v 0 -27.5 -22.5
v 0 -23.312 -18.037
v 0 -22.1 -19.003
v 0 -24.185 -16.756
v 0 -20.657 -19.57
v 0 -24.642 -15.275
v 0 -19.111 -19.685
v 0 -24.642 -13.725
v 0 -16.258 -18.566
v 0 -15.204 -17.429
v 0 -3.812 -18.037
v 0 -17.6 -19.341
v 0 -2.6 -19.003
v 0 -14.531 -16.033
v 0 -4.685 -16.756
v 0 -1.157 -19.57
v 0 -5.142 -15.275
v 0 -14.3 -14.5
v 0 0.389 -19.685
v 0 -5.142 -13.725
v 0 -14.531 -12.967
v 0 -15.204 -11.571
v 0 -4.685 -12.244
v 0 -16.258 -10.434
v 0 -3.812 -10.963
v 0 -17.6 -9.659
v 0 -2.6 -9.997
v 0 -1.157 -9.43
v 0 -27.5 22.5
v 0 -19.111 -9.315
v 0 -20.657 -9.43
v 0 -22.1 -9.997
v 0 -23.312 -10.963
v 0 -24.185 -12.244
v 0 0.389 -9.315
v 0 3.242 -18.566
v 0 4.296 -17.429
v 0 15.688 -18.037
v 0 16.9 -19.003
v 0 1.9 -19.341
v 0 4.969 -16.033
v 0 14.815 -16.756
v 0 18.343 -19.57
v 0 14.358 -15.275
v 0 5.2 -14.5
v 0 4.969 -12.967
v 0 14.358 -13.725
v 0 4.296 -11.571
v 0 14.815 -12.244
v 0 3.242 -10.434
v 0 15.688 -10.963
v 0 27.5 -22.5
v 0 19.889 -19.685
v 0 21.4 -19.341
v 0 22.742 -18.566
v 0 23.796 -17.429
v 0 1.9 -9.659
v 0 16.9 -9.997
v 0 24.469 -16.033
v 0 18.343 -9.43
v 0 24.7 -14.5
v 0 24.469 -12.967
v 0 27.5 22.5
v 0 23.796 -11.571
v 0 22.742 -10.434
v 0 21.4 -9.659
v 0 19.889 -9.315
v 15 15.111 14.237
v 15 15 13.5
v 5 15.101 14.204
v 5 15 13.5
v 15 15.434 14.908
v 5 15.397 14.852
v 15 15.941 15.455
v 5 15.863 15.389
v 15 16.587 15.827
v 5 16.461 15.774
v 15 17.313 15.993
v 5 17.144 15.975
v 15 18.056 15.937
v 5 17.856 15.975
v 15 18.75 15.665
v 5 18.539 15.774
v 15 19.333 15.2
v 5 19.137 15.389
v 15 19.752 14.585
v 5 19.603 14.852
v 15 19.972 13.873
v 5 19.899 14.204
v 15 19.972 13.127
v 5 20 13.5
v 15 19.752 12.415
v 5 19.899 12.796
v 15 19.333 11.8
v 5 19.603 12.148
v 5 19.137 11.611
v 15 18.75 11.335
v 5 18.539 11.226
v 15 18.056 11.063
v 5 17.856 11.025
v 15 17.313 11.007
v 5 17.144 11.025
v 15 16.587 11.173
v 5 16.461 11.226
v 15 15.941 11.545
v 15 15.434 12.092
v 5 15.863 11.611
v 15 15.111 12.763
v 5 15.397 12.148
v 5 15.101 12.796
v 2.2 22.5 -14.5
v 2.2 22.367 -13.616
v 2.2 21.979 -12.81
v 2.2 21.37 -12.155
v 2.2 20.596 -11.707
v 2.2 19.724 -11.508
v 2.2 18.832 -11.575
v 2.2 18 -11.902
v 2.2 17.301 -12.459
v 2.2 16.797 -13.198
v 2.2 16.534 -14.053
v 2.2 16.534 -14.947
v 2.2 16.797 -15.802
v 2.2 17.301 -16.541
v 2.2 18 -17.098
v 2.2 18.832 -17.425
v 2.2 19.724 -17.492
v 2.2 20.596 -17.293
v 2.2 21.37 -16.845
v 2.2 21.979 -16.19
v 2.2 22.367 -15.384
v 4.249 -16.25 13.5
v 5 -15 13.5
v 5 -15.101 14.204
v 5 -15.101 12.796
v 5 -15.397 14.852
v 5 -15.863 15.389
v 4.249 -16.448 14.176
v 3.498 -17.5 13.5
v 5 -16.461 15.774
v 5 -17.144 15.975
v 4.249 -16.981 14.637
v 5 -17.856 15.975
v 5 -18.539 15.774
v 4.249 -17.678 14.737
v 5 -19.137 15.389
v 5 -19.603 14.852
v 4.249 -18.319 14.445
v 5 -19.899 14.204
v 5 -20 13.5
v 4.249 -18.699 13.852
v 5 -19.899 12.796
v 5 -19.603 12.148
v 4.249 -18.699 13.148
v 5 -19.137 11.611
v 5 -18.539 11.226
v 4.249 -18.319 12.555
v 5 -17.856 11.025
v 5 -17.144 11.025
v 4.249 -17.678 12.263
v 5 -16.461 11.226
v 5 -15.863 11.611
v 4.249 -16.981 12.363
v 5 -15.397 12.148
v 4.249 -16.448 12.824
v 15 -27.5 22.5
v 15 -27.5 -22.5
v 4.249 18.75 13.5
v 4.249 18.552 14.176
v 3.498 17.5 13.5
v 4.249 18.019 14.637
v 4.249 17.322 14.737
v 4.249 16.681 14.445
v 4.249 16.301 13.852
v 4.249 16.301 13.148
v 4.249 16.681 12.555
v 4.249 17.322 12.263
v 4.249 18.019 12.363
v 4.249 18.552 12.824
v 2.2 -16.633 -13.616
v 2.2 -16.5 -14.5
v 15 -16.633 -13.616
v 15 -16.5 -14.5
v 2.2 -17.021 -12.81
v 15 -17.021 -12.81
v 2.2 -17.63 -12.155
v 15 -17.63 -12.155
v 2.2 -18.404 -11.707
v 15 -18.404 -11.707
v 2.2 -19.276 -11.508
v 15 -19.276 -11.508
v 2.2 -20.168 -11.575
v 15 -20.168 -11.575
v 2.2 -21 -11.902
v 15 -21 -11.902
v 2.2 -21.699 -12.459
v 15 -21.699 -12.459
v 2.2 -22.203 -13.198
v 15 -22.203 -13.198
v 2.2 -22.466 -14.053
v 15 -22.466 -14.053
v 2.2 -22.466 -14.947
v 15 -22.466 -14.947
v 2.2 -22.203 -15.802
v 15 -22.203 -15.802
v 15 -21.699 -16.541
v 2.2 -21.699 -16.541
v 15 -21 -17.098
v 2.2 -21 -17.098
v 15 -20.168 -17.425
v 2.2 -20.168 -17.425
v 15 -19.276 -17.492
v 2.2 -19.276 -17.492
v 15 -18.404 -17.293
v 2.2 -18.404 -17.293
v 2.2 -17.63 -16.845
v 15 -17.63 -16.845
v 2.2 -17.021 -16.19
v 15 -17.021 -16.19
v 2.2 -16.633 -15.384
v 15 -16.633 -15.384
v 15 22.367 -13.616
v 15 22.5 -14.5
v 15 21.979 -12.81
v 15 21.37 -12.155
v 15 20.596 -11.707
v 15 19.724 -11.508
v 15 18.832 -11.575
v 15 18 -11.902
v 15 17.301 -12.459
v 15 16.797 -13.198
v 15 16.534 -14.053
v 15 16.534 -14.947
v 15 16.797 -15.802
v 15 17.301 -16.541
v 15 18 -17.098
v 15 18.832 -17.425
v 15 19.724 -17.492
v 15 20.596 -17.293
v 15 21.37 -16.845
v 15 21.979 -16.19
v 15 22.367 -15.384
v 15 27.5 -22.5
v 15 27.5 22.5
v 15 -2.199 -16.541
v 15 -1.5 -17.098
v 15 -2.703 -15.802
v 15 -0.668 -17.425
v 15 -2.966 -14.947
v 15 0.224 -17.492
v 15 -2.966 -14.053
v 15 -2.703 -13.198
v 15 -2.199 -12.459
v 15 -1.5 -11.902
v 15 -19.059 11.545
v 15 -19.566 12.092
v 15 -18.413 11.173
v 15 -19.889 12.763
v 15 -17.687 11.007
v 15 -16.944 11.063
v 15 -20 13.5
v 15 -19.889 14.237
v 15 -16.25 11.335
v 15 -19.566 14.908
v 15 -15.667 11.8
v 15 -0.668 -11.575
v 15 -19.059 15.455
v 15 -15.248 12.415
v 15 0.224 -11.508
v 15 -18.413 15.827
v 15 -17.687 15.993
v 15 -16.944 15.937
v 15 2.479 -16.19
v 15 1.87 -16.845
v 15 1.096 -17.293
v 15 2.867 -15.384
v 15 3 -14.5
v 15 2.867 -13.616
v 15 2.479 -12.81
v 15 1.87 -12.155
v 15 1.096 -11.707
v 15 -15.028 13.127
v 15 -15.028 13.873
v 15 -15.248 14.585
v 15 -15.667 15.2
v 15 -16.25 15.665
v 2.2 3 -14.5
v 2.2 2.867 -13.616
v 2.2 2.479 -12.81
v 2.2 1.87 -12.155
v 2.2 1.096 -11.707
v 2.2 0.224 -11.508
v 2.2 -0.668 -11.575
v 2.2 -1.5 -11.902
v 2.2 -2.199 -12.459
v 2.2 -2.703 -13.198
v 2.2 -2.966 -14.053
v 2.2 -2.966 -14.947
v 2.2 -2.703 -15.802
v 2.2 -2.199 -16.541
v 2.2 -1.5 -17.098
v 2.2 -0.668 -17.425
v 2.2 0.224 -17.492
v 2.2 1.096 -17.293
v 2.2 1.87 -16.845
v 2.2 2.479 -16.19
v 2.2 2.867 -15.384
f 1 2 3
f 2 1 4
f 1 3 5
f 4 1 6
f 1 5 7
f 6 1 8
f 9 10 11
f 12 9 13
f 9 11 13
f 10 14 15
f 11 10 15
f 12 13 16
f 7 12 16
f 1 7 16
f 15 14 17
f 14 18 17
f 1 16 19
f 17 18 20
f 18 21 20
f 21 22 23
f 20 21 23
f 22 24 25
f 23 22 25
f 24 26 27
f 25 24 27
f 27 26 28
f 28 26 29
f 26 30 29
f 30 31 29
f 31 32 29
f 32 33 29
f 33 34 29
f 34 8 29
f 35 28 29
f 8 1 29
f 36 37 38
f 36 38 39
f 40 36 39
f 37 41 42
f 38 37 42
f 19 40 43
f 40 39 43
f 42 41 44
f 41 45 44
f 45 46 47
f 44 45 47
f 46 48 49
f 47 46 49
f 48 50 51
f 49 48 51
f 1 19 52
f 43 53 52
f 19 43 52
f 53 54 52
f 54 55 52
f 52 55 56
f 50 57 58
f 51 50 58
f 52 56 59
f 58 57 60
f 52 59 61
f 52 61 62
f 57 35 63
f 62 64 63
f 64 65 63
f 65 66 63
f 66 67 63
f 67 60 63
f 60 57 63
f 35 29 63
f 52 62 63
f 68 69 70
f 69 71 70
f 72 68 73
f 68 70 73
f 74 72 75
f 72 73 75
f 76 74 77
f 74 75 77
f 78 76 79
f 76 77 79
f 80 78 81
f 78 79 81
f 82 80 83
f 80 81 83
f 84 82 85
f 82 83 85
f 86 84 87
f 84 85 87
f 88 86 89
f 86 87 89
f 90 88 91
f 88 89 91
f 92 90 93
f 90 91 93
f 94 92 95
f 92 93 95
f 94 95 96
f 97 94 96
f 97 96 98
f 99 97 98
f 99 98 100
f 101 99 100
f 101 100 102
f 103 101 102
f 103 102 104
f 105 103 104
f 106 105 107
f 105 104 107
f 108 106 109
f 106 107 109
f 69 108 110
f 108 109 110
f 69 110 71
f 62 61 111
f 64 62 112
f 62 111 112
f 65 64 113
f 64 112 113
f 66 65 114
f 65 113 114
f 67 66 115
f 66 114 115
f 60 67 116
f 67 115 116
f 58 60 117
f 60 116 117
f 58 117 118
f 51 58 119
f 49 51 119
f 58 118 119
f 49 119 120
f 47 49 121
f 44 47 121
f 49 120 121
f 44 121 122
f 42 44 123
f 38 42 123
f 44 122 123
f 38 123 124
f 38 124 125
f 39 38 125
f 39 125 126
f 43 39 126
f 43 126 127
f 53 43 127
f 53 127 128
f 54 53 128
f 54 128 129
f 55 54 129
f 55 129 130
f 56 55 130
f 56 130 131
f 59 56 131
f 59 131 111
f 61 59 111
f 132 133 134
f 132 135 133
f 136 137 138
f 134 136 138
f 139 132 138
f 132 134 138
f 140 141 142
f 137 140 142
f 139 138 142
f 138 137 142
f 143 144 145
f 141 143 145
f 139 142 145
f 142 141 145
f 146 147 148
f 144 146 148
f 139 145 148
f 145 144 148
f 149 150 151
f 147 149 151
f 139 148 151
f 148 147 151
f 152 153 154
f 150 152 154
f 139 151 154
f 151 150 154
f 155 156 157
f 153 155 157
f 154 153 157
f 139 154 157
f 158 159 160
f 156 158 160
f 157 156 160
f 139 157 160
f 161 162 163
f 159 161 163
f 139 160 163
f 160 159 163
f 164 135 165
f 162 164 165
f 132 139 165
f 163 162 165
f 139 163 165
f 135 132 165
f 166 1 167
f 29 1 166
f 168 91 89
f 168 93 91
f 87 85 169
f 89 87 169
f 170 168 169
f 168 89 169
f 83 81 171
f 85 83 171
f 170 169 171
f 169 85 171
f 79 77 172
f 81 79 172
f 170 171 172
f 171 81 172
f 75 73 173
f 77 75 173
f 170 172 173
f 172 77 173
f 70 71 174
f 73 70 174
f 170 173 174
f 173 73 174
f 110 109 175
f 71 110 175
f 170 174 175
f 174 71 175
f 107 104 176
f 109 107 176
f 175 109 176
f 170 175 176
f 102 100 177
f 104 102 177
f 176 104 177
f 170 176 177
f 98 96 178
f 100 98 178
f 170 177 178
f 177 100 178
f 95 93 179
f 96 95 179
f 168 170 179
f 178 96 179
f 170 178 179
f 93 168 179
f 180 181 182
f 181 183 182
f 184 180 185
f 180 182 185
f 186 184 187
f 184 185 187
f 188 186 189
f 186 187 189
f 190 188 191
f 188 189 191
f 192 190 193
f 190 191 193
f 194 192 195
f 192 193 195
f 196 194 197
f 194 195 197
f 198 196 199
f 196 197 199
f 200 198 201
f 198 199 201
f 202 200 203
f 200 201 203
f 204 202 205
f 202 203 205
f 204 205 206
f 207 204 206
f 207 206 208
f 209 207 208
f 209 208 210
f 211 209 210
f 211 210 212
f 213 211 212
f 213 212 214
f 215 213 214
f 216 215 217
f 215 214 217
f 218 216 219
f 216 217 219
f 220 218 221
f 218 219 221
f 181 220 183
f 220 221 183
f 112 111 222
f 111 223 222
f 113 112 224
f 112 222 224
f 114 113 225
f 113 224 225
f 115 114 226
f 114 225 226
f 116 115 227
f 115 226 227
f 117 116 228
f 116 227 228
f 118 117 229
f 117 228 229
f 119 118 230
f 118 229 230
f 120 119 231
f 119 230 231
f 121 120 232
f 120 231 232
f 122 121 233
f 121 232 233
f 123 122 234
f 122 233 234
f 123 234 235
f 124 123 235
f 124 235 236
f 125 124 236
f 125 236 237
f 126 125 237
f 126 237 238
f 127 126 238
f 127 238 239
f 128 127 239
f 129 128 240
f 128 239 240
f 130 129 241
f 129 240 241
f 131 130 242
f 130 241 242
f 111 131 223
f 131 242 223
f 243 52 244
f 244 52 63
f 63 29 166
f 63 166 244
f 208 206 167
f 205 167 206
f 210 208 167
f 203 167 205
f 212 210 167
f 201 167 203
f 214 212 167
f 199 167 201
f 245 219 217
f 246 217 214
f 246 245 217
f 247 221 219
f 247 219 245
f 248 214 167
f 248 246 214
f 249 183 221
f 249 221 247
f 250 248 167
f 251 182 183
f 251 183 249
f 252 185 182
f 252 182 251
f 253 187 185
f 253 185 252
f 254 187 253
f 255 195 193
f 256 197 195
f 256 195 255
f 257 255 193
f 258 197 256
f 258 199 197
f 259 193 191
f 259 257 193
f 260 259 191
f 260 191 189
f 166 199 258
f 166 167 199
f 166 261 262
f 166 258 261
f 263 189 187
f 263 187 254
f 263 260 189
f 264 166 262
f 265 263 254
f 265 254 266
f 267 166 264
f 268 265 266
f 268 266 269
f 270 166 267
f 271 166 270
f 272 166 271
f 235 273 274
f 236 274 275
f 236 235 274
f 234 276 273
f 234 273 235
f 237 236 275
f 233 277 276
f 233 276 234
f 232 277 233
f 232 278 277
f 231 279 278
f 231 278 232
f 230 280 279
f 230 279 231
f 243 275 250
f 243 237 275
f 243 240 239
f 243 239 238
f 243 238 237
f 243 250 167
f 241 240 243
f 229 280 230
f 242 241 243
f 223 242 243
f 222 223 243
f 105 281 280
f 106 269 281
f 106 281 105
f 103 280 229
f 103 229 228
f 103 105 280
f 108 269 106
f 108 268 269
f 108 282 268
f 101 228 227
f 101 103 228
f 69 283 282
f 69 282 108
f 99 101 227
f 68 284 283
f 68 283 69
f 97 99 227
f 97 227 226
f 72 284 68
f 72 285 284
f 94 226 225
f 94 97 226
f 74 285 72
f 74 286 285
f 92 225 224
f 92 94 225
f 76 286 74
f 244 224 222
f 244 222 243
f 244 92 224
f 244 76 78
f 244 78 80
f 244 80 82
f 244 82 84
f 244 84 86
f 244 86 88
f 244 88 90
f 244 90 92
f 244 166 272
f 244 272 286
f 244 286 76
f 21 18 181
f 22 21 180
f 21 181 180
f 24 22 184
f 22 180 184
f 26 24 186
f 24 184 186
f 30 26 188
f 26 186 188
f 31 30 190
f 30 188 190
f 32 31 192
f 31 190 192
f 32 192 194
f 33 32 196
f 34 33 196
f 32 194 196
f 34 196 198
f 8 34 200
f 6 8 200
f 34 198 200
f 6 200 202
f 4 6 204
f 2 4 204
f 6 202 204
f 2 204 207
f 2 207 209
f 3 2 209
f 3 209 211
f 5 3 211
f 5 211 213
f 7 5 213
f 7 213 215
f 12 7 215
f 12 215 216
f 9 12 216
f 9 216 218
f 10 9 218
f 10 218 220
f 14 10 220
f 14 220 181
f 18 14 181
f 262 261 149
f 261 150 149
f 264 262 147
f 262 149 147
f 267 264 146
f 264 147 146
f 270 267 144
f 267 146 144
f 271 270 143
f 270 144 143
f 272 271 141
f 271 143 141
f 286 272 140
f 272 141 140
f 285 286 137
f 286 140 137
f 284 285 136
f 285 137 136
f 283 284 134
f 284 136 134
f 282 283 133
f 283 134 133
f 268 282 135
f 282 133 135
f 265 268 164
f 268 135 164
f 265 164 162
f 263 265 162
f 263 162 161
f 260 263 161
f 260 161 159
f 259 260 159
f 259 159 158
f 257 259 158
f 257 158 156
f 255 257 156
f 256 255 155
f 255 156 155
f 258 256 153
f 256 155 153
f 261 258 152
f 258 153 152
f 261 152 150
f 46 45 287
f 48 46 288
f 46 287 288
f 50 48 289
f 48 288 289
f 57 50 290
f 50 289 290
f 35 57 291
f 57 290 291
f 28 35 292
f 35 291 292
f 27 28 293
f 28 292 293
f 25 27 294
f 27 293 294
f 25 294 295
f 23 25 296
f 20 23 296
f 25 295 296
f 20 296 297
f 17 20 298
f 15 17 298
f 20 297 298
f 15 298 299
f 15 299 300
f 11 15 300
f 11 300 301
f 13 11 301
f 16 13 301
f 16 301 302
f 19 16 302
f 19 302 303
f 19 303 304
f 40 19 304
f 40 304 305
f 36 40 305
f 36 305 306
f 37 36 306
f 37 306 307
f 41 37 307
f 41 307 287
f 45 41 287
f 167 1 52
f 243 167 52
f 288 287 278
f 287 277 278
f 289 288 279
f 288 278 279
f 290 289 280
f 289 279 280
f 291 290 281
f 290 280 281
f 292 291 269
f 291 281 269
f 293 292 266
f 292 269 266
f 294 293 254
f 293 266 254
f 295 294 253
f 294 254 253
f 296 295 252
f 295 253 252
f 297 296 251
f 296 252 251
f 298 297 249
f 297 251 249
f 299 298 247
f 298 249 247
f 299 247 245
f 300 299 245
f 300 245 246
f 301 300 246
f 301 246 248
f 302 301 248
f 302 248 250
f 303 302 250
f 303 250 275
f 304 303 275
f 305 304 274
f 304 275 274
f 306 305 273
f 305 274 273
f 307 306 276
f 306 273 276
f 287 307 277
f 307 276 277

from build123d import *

# Parameters (mm, degrees)
F0_W           = 55
F0_H           = 45
F1_DEPTH       = 15
F4_D           = 6
F4_DEPTH       = 15
F4_CSINK_D     = 10.4
F4_CSINK_ANGLE = 90
F4_TIP         = 1.8025818571
F5_D           = 5
F5_DEPTH       = 10
F5_TIP         = 1.5021515476


with BuildPart() as f1:
    # F0 (on Right) → F1 (new body)
    with BuildSketch(Plane.YZ):
        Rectangle(F0_W, F0_H)
    extrude(amount=F1_DEPTH)

    # F4
    with Locations(Plane(origin=(0, 0, 0), x_dir=(0, -1, 0), z_dir=(-1, 0, 0))):
        with Locations((-19.5, -14.5), (0, -14.5), (19.5, -14.5)):
            CounterSinkHole(F4_D / 2, F4_CSINK_D / 2, depth=F4_DEPTH, counter_sink_angle=F4_CSINK_ANGLE)
            with Locations((0, 0, -(F4_DEPTH + F4_TIP / 2))):  # 118° drill point
                Cone(0, F4_D / 2, F4_TIP, mode=Mode.SUBTRACT)

    # F5
    with Locations(Plane.YZ.offset(15)):
        with Locations((-17.5, 13.5), (17.5, 13.5)):
            Hole(F5_D / 2, depth=F5_DEPTH)
            with Locations((0, 0, -(F5_DEPTH + F5_TIP / 2))):  # 118° drill point
                Cone(0, F5_D / 2, F5_TIP, mode=Mode.SUBTRACT)


solid = f1.part
